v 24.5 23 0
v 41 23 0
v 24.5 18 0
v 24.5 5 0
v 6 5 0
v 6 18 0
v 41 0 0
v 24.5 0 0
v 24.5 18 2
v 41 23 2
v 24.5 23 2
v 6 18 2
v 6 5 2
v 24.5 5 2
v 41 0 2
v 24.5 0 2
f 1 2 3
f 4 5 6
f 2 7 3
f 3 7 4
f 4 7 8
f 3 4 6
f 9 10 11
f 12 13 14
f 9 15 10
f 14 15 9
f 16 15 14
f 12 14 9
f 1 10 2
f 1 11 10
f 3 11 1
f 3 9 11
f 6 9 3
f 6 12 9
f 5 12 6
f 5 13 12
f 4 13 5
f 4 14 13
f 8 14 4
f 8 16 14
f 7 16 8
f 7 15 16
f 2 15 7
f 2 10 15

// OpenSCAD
 linear_extrude(2)  polygon([[41,23],[41,0],[24.5,23],[24.5,0],
[24.5,5],[6,5],[6,18],[24.5,18],[24.5,23]],paths=[[0,1,3,2,4,5,6,7,8]]);
